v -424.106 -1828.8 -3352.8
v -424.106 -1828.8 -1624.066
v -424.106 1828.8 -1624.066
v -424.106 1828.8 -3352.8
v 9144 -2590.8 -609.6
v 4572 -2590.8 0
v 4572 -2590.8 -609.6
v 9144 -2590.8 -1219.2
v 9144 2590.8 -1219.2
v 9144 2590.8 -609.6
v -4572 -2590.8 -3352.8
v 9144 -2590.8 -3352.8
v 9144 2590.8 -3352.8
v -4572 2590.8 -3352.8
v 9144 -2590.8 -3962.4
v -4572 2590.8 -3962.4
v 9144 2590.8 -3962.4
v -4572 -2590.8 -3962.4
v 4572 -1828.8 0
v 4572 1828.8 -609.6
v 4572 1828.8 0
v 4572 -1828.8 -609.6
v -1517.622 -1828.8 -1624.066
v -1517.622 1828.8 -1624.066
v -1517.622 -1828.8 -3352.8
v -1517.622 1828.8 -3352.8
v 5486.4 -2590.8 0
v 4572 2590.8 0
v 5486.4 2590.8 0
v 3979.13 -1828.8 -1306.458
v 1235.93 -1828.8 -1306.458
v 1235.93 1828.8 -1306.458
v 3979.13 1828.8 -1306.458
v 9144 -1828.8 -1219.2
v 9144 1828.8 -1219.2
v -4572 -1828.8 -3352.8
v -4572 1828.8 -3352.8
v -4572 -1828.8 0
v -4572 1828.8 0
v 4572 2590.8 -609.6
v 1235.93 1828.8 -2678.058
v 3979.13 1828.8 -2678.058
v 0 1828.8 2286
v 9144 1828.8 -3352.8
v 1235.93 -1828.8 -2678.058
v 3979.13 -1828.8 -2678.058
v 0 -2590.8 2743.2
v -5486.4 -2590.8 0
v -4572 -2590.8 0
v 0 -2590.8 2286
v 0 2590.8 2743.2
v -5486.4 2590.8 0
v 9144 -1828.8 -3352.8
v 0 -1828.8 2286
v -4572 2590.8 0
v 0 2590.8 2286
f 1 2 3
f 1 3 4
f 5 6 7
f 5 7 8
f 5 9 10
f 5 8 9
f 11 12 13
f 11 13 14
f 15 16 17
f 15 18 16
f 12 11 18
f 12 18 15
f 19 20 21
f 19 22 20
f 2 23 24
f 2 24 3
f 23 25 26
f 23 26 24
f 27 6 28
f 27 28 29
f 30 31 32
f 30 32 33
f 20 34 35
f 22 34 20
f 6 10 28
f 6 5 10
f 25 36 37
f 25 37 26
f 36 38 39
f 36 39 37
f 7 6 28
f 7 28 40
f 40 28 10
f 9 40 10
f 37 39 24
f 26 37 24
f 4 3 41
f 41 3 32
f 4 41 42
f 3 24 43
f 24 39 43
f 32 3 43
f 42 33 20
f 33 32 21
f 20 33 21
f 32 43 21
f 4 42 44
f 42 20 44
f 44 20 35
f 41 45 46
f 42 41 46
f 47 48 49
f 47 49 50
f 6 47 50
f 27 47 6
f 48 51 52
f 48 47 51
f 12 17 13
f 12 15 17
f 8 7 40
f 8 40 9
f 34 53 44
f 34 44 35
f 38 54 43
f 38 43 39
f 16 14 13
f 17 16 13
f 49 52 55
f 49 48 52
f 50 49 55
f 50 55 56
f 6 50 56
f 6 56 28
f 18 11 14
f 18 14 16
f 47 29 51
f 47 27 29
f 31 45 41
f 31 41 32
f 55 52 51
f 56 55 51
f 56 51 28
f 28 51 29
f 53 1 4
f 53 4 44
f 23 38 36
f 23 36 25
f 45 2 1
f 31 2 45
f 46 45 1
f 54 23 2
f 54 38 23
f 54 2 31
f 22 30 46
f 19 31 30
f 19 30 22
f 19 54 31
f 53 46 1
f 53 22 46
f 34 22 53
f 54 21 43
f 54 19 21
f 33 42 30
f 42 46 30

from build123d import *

# Parameters (mm, degrees)
F1_DEPTH = 2590.8
F0_W     = 4572
F0_H     = 609.6
F0_W_2   = 2743.2
F0_H_2   = 1371.6
F2_DEPTH = 1828.8


with BuildPart() as f1:
    # F0 (on Front) → F1 (new body, symmetric)
    with BuildSketch(Plane.XZ):
        Polygon((-5486.4, 0), (-4572, 0), (0, 2286), (0, 2743.2), align=None)
        Polygon((0, 2286), (4572, 0), (5486.4, 0), (0, 2743.2), align=None)
    extrude(amount=F1_DEPTH, both=True)


with BuildPart() as f1b:
    # F0 (on Front) → F1, piece 2 (new body, symmetric)
    with BuildSketch(Plane.XZ):
        Polygon((9144, -609.6), (4572, 0), (4572, -609.6), (9144, -1219.2), align=None)
    extrude(amount=F1_DEPTH, both=True)


with BuildPart() as f1c:
    # F0 (on Front) → F1, piece 3 (new body, symmetric)
    with BuildSketch(Plane.XZ):
        with Locations((6858, -3657.6)):
            Rectangle(F0_W, F0_H)
        Polygon((-1517.6217556, -3352.8), (-4572, -3352.8), (-4572, -3962.4), (4572, -3962.4), (4572, -3352.8), (-424.1059720516, -3352.8), align=None)
    extrude(amount=F1_DEPTH, both=True)


with BuildPart() as f2:
    # F0 (on Front) → F2 (new body, symmetric)
    with BuildSketch(Plane.XZ):
        Polygon((-4572, 0), (0, 0), (0, 2286), align=None)
        Polygon((0, 2286), (0, 0), (4572, 0), align=None)
        Polygon((4572, 0), (0, 0), (-4572, 0), (-4572, -3352.8), (-1517.6217556, -3352.8), (-1517.6217556, -1624.0663528442), (-424.1059720516, -1624.0663528442), (-424.1059720516, -3352.8), (4572, -3352.8), (4572, -609.6), align=None)
        with Locations((2607.5299659729, -1992.2576705933)):
            Rectangle(F0_W_2, F0_H_2, mode=Mode.SUBTRACT)
        Polygon((9144, -1219.2), (4572, -609.6), (4572, -3352.8), (9144, -3352.8), align=None)
    extrude(amount=F2_DEPTH, both=True)


solid = Compound([f1.part, f1b.part, f1c.part, f2.part])
